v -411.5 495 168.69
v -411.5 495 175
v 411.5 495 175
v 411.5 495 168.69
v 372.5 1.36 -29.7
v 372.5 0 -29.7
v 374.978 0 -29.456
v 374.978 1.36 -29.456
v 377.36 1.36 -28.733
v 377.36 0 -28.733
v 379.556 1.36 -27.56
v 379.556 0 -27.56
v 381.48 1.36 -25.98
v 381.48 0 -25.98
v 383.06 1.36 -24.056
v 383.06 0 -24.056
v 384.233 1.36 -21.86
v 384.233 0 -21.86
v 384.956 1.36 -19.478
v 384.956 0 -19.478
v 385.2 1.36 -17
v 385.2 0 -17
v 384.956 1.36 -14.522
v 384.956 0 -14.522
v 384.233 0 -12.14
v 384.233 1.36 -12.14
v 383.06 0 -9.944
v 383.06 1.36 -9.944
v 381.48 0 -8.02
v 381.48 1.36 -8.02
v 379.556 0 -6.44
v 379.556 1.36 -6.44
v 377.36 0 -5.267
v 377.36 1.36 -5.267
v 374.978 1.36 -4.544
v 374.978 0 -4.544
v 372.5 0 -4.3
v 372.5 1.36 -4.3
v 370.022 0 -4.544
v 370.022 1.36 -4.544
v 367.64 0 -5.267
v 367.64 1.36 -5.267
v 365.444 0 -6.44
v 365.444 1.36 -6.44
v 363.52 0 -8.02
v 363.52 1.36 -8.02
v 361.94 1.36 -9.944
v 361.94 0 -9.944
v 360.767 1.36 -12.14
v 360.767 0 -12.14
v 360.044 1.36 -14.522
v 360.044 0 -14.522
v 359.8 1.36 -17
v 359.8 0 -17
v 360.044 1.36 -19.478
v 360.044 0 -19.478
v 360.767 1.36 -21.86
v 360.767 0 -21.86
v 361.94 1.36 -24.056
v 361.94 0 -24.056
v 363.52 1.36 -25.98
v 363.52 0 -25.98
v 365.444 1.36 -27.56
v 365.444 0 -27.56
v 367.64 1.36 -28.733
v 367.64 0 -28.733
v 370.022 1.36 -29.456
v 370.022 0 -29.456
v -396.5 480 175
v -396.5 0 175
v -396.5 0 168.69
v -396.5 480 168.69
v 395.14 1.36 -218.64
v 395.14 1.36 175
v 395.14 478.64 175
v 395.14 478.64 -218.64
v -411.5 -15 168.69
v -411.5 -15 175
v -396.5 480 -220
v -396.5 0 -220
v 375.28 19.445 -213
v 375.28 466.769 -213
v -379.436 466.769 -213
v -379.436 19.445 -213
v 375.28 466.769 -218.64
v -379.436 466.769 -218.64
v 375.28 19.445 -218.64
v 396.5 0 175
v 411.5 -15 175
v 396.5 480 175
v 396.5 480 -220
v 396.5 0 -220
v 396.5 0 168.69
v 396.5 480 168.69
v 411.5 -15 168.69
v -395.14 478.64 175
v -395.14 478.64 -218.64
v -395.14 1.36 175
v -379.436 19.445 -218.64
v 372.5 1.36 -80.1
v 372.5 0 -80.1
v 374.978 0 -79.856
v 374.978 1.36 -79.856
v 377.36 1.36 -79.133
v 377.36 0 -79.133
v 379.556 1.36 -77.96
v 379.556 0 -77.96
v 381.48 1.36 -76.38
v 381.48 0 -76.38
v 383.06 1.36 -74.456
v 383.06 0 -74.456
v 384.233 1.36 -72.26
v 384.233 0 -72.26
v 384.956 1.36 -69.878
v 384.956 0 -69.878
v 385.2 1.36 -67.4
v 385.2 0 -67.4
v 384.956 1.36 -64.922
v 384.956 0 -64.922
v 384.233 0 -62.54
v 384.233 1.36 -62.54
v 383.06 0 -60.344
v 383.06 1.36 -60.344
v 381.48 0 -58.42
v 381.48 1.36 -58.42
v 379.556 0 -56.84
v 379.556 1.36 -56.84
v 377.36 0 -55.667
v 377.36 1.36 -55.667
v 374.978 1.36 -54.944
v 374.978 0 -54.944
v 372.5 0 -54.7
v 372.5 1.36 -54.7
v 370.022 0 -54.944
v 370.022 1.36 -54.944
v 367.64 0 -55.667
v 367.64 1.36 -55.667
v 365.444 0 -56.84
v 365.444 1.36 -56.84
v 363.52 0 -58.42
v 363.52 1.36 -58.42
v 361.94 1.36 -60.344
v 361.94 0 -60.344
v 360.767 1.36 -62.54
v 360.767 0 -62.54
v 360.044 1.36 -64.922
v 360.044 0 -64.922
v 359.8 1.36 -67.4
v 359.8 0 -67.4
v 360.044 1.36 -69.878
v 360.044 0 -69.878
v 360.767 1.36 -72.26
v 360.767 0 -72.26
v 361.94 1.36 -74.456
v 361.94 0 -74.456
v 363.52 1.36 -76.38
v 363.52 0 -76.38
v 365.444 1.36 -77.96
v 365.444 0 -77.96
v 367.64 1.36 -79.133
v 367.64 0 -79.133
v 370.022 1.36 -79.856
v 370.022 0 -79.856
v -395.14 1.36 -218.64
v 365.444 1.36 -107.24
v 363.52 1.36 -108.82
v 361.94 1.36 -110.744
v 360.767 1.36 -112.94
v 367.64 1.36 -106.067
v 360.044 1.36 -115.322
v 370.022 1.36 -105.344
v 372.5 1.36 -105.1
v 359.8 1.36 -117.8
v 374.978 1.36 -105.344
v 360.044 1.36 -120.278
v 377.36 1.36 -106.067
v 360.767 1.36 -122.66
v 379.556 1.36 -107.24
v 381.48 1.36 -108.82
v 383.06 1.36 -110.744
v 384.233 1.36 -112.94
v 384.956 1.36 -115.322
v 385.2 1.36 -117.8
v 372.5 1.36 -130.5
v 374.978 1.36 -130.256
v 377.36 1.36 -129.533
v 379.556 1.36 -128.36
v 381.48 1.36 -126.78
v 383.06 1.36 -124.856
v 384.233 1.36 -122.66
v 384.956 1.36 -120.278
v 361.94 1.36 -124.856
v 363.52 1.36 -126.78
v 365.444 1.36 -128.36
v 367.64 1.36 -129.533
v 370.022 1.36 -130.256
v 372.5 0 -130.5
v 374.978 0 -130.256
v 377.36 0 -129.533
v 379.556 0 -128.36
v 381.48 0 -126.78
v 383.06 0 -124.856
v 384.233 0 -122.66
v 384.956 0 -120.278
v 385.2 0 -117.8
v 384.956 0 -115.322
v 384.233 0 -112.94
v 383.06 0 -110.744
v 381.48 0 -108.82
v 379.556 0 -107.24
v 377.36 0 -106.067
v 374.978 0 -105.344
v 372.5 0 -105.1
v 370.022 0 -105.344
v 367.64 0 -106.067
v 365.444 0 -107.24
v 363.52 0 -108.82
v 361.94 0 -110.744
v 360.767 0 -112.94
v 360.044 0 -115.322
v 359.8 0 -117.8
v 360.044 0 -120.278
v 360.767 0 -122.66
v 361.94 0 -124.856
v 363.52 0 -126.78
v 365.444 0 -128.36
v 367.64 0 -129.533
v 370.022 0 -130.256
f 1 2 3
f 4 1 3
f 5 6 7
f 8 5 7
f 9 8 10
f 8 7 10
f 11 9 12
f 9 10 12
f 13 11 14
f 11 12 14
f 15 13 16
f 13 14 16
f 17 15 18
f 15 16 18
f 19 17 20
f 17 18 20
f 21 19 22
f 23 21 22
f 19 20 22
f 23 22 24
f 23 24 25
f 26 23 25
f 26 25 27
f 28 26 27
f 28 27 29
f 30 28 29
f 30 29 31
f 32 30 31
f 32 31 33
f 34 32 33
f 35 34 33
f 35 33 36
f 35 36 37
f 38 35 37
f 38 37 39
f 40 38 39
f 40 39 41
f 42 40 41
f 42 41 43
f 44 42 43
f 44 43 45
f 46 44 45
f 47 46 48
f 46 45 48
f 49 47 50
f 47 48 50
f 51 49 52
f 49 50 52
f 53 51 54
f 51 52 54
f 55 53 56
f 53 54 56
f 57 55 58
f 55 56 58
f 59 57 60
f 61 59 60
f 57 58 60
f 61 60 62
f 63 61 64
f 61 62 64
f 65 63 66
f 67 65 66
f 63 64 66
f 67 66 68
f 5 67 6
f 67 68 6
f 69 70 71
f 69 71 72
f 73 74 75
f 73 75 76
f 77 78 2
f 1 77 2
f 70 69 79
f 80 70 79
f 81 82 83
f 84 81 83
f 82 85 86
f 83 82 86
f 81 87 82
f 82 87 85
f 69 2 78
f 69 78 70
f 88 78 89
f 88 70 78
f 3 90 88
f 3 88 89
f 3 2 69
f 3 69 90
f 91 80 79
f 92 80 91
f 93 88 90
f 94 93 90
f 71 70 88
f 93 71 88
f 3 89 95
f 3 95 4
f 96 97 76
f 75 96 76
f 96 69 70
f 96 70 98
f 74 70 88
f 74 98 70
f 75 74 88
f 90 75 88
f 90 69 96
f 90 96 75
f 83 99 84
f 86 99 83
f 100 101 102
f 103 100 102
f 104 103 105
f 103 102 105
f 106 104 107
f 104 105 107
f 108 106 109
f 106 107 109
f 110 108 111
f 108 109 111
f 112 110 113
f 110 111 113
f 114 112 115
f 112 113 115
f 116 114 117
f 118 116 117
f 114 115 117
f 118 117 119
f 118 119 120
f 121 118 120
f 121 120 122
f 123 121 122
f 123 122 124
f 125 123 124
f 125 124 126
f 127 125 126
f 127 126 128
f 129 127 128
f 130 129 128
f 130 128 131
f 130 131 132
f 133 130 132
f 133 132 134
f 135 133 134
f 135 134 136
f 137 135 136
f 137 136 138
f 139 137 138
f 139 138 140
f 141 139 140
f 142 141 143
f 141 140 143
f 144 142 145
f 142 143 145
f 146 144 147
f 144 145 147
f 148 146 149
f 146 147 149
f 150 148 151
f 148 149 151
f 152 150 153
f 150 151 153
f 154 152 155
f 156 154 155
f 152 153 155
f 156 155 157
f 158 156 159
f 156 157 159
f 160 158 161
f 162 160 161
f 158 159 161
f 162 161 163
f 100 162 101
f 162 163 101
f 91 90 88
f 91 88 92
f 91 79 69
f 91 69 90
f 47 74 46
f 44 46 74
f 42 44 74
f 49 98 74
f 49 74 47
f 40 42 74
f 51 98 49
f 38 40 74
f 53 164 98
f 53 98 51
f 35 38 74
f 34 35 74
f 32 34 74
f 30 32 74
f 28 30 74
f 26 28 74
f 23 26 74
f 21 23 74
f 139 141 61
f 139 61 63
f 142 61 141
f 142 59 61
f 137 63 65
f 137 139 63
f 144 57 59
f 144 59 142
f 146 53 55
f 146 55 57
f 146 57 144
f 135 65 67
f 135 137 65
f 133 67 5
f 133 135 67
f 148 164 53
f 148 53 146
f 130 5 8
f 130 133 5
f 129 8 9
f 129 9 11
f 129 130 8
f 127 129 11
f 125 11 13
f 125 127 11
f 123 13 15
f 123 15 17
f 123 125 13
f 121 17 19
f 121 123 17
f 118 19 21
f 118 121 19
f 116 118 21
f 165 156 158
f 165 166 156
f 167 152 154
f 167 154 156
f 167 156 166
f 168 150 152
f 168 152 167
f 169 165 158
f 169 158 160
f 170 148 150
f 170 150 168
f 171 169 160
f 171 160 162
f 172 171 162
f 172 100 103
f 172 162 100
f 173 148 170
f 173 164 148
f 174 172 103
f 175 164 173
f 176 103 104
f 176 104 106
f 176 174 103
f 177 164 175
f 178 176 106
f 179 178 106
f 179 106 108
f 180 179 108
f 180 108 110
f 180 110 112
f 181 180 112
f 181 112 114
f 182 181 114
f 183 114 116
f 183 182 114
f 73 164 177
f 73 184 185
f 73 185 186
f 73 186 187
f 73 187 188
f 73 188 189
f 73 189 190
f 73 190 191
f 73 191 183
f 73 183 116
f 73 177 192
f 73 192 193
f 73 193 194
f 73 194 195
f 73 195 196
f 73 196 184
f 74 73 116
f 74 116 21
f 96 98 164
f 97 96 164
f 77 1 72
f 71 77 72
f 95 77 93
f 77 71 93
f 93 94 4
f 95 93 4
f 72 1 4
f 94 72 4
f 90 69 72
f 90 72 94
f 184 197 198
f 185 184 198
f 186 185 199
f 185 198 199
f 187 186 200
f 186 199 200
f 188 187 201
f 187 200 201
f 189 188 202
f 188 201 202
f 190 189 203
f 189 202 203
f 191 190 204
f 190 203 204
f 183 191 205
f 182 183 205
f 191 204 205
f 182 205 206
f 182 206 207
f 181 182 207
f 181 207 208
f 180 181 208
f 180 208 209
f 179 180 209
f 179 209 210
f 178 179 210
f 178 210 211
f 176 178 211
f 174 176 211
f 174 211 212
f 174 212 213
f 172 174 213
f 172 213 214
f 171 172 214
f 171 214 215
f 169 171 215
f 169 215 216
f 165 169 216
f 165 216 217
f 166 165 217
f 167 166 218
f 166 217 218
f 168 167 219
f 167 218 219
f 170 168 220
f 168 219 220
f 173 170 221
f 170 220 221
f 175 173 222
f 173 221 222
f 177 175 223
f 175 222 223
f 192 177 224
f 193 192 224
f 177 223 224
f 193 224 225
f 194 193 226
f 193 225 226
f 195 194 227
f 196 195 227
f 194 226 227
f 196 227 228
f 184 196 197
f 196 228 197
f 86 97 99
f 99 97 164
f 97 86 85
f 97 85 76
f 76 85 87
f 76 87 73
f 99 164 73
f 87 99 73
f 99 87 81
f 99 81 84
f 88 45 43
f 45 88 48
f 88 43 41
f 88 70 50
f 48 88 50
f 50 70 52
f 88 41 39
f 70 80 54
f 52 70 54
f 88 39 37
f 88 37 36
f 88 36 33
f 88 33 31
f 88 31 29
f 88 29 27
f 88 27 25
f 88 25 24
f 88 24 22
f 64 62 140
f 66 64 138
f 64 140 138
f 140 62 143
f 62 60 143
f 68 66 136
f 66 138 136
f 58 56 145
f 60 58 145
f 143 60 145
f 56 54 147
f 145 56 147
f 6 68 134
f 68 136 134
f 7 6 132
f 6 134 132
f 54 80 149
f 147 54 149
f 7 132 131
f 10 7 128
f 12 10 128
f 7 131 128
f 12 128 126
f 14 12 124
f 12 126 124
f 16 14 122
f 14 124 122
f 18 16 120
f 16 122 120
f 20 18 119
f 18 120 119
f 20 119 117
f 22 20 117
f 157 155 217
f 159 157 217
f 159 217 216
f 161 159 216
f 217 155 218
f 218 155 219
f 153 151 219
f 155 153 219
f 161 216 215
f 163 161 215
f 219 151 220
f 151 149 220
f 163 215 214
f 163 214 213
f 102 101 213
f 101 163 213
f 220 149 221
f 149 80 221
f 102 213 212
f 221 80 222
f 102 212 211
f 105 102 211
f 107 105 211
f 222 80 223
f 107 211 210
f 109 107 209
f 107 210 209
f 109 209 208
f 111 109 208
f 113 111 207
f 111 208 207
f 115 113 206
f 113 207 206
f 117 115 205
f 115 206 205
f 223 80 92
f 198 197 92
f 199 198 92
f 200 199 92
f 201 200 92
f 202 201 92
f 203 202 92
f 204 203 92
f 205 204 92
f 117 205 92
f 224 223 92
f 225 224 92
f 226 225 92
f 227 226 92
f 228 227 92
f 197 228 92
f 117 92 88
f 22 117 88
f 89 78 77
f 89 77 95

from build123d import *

# Parameters (mm, degrees)
CROQUIS1_W              = 793
CROQUIS1_H              = 440
SALIENTE_EXTRUIR1_DEPTH = 480
VACIADO1_T              = -1.36
CROQUIS2_R              = 12.7
CORTAR_EXTRUIR1_DEPTH   = 80
CROQUIS3_R              = 6.35
CORTAR_EXTRUIR2_DEPTH   = 10
CROQUIS5_R              = 6.35
CORTAR_EXTRUIR4_DEPTH   = 10
CROQUIS8_R              = 12.7
CORTAR_EXTRUIR6_DEPTH   = 10
CROQUIS9_W              = 25.745560897
CROQUIS9_H              = 149.422371693
SALIENTE_EXTRUIR2_DEPTH = 1.36
CROQUIS18_R             = 3.175
CROQUIS18_R_2           = 5.554937391
CORTAR_EXTRUIR12_DEPTH  = 10
CROQUIS19_W             = 793
CROQUIS19_H             = 480
CORTAR_EXTRUIR13_DEPTH  = 45
CROQUIS20_W             = 40.222844752
CROQUIS20_H             = 335.190372933
SALIENTE_EXTRUIR3_DEPTH = 1.36
CROQUIS22_W             = 754.715939893
CROQUIS22_H             = 447.32434432
SALIENTE_EXTRUIR4_DEPTH = 7
CROQUIS23_W             = 823
CROQUIS23_H             = 510
CROQUIS23_W_2           = 793
CROQUIS23_H_2           = 480
SALIENTE_EXTRUIR5_DEPTH = 6.31
CROQUIS24_R             = 12.7
CORTAR_EXTRUIR14_DEPTH  = 10


with BuildPart() as part:
    # Croquis1 → Saliente-Extruir1 (new body)
    with BuildSketch(Plane(origin=(0, 0, 0), x_dir=(1, 0, 0), z_dir=(0, 1, 0))):
        Rectangle(CROQUIS1_W, CROQUIS1_H)
    extrude(amount=SALIENTE_EXTRUIR1_DEPTH)

    # Vaciado1
    vaciado1_openings = [part.faces().sort_by_distance(p)[0] for p in [
        (0, 240, 220),
    ]]
    offset(amount=VACIADO1_T, openings=vaciado1_openings, kind=Kind.INTERSECTION)

    # Croquis2 → Cortar-Extruir1 (cut)
    with BuildSketch(Plane.XZ):
        with Locations(Location((-340.681431581, 41.288678468, 0), (0, 0, 270))):
            Circle(CROQUIS2_R)
    cortar_extruir1 = extrude(amount=-CORTAR_EXTRUIR1_DEPTH, mode=Mode.SUBTRACT)

    # Croquis3 → Cortar-Extruir2 (cut)
    with BuildSketch(Plane.XZ):
        with Locations(Location((-340.681431581, 81.288678468, 0), (0, 0, 270))):
            Circle(CROQUIS3_R)
    cortar_extruir2 = extrude(amount=-CORTAR_EXTRUIR2_DEPTH, mode=Mode.SUBTRACT)

    # Croquis5 → Cortar-Extruir4 (cut)
    with BuildSketch(Plane.XZ):
        with Locations(Location((-340.681431581, 121.288678468, 0), (0, 0, 270))):
            Circle(CROQUIS5_R)
    cortar_extruir4 = extrude(amount=-CORTAR_EXTRUIR4_DEPTH, mode=Mode.SUBTRACT)

    # Simetría1: Cortar-Extruir1, Cortar-Extruir2, Cortar-Extruir4 across plane
    add(cortar_extruir1.mirror(Plane(origin=(0, 0, 0), x_dir=(0, 0, 1), z_dir=(1, 0, 0))), mode=Mode.SUBTRACT)
    add(cortar_extruir2.mirror(Plane(origin=(0, 0, 0), x_dir=(0, 0, 1), z_dir=(1, 0, 0))), mode=Mode.SUBTRACT)
    add(cortar_extruir4.mirror(Plane(origin=(0, 0, 0), x_dir=(0, 0, 1), z_dir=(1, 0, 0))), mode=Mode.SUBTRACT)

    # Croquis8 → Cortar-Extruir6 (cut)
    with BuildSketch(Plane.XZ):
        with Locations(Location((340.681431581, -121.411321532, 0), (0, 0, 270))):
            Circle(CROQUIS8_R)
    extrude(amount=-CORTAR_EXTRUIR6_DEPTH, mode=Mode.SUBTRACT)

    # Croquis9 → Saliente-Extruir2 (add)
    with BuildSketch(Plane(origin=(0, 1.36, 0), x_dir=(1, 0, 0), z_dir=(0, 1, 0))):
        with Locations((-340.681431581, -81.288678468)):
            Rectangle(CROQUIS9_W, CROQUIS9_H)
    extrude(amount=-SALIENTE_EXTRUIR2_DEPTH)

    # Croquis18 → Cortar-Extruir12 (cut)
    with BuildSketch(Plane.XY.offset(-218.64)):
        with Locations((-348, 438)):
            Circle(CROQUIS18_R)
        with Locations((0, 438)):
            Circle(CROQUIS18_R)
        with Locations((348, 438)):
            Circle(CROQUIS18_R)
        with Locations((348, 240)):
            Circle(CROQUIS18_R)
        with Locations((348, 42)):
            Circle(CROQUIS18_R)
        with Locations((0, 42)):
            Circle(CROQUIS18_R)
        with Locations((-348, 42)):
            Circle(CROQUIS18_R)
        with Locations((-348, 240)):
            Circle(CROQUIS18_R_2)
    extrude(amount=-CORTAR_EXTRUIR12_DEPTH, mode=Mode.SUBTRACT)

    # Croquis19 → Cortar-Extruir13 (cut)
    with BuildSketch(Plane.XY.offset(220)):
        with Locations((0, 240)):
            Rectangle(CROQUIS19_W, CROQUIS19_H)
    extrude(amount=-CORTAR_EXTRUIR13_DEPTH, mode=Mode.SUBTRACT)

    # Croquis20 → Saliente-Extruir3 (add)
    with BuildSketch(Plane.XZ):
        with Locations((336.531134424, -29.98561058)):
            Rectangle(CROQUIS20_W, CROQUIS20_H)
    extrude(amount=-SALIENTE_EXTRUIR3_DEPTH)

    # Croquis22 → Saliente-Extruir4 (add)
    with BuildSketch(Plane(origin=(0, 0, -220), x_dir=(-1, 0, 0), z_dir=(0, 0, -1))):
        with Locations((2.077532213, 243.10690677)):
            Rectangle(CROQUIS22_W, CROQUIS22_H)
    extrude(amount=-SALIENTE_EXTRUIR4_DEPTH)

    # Croquis24 → Cortar-Extruir14 (cut)
    with BuildSketch(Plane.XZ):
        with Locations(Location((372.5, -117.8, 0), (0, 0, 270))):
            Circle(CROQUIS24_R)
        with Locations(Location((372.5, -67.4, 0), (0, 0, 270))):
            Circle(CROQUIS24_R)
        with Locations(Location((372.5, -17, 0), (0, 0, 270))):
            Circle(CROQUIS24_R)
    extrude(amount=-CORTAR_EXTRUIR14_DEPTH, mode=Mode.SUBTRACT)


with BuildPart() as body_2:
    # Croquis23 → Saliente-Extruir5 (new body)
    with BuildSketch(Plane.XY.offset(175)):
        with Locations((0, 240)):
            Rectangle(CROQUIS23_W, CROQUIS23_H)
        with Locations((0, 240)):
            Rectangle(CROQUIS23_W_2, CROQUIS23_H_2, mode=Mode.SUBTRACT)
    extrude(amount=-SALIENTE_EXTRUIR5_DEPTH)


solid = Compound([part.part, body_2.part])
